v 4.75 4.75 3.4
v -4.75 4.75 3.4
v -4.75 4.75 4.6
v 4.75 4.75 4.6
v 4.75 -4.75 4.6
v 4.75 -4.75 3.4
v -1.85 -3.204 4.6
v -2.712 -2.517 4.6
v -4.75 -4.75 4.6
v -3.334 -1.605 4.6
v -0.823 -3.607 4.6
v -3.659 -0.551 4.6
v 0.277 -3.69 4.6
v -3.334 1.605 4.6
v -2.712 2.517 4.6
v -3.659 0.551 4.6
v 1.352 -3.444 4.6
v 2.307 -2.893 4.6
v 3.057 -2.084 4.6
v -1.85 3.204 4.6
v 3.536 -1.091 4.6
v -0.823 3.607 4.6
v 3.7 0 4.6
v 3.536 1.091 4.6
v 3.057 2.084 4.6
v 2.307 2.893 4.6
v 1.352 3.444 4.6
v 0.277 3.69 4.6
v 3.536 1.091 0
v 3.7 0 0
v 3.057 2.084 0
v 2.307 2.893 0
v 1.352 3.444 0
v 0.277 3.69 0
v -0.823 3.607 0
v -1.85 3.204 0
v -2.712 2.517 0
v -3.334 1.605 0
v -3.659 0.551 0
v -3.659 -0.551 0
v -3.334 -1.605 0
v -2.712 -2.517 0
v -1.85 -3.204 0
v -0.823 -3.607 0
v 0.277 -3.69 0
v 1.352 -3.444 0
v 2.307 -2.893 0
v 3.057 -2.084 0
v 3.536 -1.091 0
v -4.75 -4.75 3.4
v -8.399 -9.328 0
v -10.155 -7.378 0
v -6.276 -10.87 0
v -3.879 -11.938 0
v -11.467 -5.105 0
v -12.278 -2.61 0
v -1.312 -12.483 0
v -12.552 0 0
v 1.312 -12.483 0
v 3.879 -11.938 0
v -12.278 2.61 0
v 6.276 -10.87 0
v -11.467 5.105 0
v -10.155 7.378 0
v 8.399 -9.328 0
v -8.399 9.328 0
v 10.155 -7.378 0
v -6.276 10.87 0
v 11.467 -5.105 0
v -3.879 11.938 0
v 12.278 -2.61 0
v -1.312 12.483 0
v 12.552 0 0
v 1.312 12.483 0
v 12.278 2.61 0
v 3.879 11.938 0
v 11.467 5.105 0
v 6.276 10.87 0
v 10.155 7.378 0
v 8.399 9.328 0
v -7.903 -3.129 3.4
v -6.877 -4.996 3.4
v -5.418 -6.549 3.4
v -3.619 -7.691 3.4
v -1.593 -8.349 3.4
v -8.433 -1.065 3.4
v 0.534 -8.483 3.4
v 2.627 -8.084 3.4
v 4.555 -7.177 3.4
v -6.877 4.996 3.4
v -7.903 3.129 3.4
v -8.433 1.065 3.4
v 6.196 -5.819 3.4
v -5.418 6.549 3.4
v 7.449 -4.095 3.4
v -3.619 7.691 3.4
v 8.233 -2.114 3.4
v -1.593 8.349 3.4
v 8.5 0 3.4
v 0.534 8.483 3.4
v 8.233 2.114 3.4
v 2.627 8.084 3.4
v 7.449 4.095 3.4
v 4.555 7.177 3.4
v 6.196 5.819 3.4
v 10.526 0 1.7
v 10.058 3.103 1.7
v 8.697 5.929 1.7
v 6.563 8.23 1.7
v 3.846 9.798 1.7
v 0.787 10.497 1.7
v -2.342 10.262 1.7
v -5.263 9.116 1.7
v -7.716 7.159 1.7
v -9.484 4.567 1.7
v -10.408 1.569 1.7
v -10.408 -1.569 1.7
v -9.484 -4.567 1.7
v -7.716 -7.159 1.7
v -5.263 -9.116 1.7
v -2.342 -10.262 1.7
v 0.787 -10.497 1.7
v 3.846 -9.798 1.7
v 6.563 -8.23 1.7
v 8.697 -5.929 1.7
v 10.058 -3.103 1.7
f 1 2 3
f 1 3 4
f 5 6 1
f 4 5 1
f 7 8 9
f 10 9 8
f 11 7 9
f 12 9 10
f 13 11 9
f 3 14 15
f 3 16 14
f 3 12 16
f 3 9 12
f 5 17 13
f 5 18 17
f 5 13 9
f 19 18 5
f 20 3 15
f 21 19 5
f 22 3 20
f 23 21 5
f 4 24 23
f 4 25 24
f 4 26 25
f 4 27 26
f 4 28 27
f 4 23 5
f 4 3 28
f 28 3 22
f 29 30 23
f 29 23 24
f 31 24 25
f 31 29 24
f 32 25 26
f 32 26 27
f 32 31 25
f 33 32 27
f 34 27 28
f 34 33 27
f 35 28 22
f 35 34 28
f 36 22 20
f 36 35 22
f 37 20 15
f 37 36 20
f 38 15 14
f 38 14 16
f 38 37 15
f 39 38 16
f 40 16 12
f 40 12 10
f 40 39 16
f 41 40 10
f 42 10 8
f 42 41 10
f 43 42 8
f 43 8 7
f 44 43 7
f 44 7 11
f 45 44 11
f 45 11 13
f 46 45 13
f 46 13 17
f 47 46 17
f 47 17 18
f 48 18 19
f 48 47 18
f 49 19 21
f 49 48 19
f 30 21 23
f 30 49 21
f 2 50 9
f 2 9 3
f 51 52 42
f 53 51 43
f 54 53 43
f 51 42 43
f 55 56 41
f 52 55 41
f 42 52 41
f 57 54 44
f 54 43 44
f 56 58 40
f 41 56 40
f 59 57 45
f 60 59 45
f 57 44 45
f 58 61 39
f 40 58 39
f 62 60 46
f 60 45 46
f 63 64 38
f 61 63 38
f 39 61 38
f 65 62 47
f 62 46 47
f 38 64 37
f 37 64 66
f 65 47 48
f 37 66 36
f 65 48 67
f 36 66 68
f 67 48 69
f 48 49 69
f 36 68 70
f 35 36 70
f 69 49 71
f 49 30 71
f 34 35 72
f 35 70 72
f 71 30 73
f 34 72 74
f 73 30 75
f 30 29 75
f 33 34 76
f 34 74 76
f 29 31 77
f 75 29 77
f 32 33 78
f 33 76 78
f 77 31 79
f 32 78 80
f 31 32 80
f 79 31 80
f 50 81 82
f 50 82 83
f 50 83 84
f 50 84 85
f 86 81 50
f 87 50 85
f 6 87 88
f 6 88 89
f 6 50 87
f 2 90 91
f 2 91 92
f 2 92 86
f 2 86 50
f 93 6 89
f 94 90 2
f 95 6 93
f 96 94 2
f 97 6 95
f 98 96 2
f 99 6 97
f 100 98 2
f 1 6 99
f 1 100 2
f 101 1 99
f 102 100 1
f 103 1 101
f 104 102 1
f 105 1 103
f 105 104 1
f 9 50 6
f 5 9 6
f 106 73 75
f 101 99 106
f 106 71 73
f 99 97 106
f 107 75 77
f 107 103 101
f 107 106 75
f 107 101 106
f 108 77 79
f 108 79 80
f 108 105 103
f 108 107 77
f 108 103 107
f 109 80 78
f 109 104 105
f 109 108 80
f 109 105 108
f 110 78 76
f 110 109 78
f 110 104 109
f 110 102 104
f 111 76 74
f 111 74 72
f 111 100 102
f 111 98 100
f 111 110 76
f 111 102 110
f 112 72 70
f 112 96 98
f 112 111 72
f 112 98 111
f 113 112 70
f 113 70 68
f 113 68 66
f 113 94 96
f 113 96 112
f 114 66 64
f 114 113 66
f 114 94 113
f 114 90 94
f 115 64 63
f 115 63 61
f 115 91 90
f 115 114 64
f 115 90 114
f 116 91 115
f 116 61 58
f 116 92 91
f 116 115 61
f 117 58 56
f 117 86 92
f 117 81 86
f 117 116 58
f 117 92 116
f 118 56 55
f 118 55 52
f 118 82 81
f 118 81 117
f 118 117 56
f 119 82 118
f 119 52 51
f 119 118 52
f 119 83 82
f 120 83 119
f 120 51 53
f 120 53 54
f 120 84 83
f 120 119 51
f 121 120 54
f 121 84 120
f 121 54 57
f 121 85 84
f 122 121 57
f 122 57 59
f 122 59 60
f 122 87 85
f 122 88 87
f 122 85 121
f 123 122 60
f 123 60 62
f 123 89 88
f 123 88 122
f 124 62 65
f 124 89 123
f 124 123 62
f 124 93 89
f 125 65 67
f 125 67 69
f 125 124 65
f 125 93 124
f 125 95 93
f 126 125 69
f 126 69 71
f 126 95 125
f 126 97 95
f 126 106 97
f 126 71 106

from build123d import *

# Parameters (mm, degrees)
F0_R     = 14
F0_W     = 9.5
F0_H     = 9.5
F1_DEPTH = 3.4
F0_R_2   = 3.7
F2_DEPTH = 4.6


# Not quite as in the source:
# - a fillet or chamfer that OpenCascade refuses, or shapes differently, is made with other operations: its cross-section is extruded or revolved along the edge and cut away or added


with BuildPart() as f1:
    # F0 (on Top) → F1 (new body)
    with BuildSketch(Plane.XY):
        Circle(F0_R)
        Rectangle(F0_W, F0_H, mode=Mode.SUBTRACT)
    extrude(amount=F1_DEPTH)

    # F0 (on Top) → F2 (join)
    with BuildSketch(Plane.XY):
        Rectangle(F0_W, F0_H)
        Circle(F0_R_2, mode=Mode.SUBTRACT)
    extrude(amount=F2_DEPTH)

    # F3: chamfer of 5.5 x 4.6150479715 on 1 edges, made by hand

    # F3_s1 → F3_t2 (revolve, cut)
    with BuildSketch(Plane.XZ):
        Polygon((14, -1.2150479715), (8.5, 3.4), (14, 3.4), align=None)
    revolve(axis=Axis((0, 0, 3.4), (0, 0, 1)), mode=Mode.SUBTRACT)


solid = f1.part
